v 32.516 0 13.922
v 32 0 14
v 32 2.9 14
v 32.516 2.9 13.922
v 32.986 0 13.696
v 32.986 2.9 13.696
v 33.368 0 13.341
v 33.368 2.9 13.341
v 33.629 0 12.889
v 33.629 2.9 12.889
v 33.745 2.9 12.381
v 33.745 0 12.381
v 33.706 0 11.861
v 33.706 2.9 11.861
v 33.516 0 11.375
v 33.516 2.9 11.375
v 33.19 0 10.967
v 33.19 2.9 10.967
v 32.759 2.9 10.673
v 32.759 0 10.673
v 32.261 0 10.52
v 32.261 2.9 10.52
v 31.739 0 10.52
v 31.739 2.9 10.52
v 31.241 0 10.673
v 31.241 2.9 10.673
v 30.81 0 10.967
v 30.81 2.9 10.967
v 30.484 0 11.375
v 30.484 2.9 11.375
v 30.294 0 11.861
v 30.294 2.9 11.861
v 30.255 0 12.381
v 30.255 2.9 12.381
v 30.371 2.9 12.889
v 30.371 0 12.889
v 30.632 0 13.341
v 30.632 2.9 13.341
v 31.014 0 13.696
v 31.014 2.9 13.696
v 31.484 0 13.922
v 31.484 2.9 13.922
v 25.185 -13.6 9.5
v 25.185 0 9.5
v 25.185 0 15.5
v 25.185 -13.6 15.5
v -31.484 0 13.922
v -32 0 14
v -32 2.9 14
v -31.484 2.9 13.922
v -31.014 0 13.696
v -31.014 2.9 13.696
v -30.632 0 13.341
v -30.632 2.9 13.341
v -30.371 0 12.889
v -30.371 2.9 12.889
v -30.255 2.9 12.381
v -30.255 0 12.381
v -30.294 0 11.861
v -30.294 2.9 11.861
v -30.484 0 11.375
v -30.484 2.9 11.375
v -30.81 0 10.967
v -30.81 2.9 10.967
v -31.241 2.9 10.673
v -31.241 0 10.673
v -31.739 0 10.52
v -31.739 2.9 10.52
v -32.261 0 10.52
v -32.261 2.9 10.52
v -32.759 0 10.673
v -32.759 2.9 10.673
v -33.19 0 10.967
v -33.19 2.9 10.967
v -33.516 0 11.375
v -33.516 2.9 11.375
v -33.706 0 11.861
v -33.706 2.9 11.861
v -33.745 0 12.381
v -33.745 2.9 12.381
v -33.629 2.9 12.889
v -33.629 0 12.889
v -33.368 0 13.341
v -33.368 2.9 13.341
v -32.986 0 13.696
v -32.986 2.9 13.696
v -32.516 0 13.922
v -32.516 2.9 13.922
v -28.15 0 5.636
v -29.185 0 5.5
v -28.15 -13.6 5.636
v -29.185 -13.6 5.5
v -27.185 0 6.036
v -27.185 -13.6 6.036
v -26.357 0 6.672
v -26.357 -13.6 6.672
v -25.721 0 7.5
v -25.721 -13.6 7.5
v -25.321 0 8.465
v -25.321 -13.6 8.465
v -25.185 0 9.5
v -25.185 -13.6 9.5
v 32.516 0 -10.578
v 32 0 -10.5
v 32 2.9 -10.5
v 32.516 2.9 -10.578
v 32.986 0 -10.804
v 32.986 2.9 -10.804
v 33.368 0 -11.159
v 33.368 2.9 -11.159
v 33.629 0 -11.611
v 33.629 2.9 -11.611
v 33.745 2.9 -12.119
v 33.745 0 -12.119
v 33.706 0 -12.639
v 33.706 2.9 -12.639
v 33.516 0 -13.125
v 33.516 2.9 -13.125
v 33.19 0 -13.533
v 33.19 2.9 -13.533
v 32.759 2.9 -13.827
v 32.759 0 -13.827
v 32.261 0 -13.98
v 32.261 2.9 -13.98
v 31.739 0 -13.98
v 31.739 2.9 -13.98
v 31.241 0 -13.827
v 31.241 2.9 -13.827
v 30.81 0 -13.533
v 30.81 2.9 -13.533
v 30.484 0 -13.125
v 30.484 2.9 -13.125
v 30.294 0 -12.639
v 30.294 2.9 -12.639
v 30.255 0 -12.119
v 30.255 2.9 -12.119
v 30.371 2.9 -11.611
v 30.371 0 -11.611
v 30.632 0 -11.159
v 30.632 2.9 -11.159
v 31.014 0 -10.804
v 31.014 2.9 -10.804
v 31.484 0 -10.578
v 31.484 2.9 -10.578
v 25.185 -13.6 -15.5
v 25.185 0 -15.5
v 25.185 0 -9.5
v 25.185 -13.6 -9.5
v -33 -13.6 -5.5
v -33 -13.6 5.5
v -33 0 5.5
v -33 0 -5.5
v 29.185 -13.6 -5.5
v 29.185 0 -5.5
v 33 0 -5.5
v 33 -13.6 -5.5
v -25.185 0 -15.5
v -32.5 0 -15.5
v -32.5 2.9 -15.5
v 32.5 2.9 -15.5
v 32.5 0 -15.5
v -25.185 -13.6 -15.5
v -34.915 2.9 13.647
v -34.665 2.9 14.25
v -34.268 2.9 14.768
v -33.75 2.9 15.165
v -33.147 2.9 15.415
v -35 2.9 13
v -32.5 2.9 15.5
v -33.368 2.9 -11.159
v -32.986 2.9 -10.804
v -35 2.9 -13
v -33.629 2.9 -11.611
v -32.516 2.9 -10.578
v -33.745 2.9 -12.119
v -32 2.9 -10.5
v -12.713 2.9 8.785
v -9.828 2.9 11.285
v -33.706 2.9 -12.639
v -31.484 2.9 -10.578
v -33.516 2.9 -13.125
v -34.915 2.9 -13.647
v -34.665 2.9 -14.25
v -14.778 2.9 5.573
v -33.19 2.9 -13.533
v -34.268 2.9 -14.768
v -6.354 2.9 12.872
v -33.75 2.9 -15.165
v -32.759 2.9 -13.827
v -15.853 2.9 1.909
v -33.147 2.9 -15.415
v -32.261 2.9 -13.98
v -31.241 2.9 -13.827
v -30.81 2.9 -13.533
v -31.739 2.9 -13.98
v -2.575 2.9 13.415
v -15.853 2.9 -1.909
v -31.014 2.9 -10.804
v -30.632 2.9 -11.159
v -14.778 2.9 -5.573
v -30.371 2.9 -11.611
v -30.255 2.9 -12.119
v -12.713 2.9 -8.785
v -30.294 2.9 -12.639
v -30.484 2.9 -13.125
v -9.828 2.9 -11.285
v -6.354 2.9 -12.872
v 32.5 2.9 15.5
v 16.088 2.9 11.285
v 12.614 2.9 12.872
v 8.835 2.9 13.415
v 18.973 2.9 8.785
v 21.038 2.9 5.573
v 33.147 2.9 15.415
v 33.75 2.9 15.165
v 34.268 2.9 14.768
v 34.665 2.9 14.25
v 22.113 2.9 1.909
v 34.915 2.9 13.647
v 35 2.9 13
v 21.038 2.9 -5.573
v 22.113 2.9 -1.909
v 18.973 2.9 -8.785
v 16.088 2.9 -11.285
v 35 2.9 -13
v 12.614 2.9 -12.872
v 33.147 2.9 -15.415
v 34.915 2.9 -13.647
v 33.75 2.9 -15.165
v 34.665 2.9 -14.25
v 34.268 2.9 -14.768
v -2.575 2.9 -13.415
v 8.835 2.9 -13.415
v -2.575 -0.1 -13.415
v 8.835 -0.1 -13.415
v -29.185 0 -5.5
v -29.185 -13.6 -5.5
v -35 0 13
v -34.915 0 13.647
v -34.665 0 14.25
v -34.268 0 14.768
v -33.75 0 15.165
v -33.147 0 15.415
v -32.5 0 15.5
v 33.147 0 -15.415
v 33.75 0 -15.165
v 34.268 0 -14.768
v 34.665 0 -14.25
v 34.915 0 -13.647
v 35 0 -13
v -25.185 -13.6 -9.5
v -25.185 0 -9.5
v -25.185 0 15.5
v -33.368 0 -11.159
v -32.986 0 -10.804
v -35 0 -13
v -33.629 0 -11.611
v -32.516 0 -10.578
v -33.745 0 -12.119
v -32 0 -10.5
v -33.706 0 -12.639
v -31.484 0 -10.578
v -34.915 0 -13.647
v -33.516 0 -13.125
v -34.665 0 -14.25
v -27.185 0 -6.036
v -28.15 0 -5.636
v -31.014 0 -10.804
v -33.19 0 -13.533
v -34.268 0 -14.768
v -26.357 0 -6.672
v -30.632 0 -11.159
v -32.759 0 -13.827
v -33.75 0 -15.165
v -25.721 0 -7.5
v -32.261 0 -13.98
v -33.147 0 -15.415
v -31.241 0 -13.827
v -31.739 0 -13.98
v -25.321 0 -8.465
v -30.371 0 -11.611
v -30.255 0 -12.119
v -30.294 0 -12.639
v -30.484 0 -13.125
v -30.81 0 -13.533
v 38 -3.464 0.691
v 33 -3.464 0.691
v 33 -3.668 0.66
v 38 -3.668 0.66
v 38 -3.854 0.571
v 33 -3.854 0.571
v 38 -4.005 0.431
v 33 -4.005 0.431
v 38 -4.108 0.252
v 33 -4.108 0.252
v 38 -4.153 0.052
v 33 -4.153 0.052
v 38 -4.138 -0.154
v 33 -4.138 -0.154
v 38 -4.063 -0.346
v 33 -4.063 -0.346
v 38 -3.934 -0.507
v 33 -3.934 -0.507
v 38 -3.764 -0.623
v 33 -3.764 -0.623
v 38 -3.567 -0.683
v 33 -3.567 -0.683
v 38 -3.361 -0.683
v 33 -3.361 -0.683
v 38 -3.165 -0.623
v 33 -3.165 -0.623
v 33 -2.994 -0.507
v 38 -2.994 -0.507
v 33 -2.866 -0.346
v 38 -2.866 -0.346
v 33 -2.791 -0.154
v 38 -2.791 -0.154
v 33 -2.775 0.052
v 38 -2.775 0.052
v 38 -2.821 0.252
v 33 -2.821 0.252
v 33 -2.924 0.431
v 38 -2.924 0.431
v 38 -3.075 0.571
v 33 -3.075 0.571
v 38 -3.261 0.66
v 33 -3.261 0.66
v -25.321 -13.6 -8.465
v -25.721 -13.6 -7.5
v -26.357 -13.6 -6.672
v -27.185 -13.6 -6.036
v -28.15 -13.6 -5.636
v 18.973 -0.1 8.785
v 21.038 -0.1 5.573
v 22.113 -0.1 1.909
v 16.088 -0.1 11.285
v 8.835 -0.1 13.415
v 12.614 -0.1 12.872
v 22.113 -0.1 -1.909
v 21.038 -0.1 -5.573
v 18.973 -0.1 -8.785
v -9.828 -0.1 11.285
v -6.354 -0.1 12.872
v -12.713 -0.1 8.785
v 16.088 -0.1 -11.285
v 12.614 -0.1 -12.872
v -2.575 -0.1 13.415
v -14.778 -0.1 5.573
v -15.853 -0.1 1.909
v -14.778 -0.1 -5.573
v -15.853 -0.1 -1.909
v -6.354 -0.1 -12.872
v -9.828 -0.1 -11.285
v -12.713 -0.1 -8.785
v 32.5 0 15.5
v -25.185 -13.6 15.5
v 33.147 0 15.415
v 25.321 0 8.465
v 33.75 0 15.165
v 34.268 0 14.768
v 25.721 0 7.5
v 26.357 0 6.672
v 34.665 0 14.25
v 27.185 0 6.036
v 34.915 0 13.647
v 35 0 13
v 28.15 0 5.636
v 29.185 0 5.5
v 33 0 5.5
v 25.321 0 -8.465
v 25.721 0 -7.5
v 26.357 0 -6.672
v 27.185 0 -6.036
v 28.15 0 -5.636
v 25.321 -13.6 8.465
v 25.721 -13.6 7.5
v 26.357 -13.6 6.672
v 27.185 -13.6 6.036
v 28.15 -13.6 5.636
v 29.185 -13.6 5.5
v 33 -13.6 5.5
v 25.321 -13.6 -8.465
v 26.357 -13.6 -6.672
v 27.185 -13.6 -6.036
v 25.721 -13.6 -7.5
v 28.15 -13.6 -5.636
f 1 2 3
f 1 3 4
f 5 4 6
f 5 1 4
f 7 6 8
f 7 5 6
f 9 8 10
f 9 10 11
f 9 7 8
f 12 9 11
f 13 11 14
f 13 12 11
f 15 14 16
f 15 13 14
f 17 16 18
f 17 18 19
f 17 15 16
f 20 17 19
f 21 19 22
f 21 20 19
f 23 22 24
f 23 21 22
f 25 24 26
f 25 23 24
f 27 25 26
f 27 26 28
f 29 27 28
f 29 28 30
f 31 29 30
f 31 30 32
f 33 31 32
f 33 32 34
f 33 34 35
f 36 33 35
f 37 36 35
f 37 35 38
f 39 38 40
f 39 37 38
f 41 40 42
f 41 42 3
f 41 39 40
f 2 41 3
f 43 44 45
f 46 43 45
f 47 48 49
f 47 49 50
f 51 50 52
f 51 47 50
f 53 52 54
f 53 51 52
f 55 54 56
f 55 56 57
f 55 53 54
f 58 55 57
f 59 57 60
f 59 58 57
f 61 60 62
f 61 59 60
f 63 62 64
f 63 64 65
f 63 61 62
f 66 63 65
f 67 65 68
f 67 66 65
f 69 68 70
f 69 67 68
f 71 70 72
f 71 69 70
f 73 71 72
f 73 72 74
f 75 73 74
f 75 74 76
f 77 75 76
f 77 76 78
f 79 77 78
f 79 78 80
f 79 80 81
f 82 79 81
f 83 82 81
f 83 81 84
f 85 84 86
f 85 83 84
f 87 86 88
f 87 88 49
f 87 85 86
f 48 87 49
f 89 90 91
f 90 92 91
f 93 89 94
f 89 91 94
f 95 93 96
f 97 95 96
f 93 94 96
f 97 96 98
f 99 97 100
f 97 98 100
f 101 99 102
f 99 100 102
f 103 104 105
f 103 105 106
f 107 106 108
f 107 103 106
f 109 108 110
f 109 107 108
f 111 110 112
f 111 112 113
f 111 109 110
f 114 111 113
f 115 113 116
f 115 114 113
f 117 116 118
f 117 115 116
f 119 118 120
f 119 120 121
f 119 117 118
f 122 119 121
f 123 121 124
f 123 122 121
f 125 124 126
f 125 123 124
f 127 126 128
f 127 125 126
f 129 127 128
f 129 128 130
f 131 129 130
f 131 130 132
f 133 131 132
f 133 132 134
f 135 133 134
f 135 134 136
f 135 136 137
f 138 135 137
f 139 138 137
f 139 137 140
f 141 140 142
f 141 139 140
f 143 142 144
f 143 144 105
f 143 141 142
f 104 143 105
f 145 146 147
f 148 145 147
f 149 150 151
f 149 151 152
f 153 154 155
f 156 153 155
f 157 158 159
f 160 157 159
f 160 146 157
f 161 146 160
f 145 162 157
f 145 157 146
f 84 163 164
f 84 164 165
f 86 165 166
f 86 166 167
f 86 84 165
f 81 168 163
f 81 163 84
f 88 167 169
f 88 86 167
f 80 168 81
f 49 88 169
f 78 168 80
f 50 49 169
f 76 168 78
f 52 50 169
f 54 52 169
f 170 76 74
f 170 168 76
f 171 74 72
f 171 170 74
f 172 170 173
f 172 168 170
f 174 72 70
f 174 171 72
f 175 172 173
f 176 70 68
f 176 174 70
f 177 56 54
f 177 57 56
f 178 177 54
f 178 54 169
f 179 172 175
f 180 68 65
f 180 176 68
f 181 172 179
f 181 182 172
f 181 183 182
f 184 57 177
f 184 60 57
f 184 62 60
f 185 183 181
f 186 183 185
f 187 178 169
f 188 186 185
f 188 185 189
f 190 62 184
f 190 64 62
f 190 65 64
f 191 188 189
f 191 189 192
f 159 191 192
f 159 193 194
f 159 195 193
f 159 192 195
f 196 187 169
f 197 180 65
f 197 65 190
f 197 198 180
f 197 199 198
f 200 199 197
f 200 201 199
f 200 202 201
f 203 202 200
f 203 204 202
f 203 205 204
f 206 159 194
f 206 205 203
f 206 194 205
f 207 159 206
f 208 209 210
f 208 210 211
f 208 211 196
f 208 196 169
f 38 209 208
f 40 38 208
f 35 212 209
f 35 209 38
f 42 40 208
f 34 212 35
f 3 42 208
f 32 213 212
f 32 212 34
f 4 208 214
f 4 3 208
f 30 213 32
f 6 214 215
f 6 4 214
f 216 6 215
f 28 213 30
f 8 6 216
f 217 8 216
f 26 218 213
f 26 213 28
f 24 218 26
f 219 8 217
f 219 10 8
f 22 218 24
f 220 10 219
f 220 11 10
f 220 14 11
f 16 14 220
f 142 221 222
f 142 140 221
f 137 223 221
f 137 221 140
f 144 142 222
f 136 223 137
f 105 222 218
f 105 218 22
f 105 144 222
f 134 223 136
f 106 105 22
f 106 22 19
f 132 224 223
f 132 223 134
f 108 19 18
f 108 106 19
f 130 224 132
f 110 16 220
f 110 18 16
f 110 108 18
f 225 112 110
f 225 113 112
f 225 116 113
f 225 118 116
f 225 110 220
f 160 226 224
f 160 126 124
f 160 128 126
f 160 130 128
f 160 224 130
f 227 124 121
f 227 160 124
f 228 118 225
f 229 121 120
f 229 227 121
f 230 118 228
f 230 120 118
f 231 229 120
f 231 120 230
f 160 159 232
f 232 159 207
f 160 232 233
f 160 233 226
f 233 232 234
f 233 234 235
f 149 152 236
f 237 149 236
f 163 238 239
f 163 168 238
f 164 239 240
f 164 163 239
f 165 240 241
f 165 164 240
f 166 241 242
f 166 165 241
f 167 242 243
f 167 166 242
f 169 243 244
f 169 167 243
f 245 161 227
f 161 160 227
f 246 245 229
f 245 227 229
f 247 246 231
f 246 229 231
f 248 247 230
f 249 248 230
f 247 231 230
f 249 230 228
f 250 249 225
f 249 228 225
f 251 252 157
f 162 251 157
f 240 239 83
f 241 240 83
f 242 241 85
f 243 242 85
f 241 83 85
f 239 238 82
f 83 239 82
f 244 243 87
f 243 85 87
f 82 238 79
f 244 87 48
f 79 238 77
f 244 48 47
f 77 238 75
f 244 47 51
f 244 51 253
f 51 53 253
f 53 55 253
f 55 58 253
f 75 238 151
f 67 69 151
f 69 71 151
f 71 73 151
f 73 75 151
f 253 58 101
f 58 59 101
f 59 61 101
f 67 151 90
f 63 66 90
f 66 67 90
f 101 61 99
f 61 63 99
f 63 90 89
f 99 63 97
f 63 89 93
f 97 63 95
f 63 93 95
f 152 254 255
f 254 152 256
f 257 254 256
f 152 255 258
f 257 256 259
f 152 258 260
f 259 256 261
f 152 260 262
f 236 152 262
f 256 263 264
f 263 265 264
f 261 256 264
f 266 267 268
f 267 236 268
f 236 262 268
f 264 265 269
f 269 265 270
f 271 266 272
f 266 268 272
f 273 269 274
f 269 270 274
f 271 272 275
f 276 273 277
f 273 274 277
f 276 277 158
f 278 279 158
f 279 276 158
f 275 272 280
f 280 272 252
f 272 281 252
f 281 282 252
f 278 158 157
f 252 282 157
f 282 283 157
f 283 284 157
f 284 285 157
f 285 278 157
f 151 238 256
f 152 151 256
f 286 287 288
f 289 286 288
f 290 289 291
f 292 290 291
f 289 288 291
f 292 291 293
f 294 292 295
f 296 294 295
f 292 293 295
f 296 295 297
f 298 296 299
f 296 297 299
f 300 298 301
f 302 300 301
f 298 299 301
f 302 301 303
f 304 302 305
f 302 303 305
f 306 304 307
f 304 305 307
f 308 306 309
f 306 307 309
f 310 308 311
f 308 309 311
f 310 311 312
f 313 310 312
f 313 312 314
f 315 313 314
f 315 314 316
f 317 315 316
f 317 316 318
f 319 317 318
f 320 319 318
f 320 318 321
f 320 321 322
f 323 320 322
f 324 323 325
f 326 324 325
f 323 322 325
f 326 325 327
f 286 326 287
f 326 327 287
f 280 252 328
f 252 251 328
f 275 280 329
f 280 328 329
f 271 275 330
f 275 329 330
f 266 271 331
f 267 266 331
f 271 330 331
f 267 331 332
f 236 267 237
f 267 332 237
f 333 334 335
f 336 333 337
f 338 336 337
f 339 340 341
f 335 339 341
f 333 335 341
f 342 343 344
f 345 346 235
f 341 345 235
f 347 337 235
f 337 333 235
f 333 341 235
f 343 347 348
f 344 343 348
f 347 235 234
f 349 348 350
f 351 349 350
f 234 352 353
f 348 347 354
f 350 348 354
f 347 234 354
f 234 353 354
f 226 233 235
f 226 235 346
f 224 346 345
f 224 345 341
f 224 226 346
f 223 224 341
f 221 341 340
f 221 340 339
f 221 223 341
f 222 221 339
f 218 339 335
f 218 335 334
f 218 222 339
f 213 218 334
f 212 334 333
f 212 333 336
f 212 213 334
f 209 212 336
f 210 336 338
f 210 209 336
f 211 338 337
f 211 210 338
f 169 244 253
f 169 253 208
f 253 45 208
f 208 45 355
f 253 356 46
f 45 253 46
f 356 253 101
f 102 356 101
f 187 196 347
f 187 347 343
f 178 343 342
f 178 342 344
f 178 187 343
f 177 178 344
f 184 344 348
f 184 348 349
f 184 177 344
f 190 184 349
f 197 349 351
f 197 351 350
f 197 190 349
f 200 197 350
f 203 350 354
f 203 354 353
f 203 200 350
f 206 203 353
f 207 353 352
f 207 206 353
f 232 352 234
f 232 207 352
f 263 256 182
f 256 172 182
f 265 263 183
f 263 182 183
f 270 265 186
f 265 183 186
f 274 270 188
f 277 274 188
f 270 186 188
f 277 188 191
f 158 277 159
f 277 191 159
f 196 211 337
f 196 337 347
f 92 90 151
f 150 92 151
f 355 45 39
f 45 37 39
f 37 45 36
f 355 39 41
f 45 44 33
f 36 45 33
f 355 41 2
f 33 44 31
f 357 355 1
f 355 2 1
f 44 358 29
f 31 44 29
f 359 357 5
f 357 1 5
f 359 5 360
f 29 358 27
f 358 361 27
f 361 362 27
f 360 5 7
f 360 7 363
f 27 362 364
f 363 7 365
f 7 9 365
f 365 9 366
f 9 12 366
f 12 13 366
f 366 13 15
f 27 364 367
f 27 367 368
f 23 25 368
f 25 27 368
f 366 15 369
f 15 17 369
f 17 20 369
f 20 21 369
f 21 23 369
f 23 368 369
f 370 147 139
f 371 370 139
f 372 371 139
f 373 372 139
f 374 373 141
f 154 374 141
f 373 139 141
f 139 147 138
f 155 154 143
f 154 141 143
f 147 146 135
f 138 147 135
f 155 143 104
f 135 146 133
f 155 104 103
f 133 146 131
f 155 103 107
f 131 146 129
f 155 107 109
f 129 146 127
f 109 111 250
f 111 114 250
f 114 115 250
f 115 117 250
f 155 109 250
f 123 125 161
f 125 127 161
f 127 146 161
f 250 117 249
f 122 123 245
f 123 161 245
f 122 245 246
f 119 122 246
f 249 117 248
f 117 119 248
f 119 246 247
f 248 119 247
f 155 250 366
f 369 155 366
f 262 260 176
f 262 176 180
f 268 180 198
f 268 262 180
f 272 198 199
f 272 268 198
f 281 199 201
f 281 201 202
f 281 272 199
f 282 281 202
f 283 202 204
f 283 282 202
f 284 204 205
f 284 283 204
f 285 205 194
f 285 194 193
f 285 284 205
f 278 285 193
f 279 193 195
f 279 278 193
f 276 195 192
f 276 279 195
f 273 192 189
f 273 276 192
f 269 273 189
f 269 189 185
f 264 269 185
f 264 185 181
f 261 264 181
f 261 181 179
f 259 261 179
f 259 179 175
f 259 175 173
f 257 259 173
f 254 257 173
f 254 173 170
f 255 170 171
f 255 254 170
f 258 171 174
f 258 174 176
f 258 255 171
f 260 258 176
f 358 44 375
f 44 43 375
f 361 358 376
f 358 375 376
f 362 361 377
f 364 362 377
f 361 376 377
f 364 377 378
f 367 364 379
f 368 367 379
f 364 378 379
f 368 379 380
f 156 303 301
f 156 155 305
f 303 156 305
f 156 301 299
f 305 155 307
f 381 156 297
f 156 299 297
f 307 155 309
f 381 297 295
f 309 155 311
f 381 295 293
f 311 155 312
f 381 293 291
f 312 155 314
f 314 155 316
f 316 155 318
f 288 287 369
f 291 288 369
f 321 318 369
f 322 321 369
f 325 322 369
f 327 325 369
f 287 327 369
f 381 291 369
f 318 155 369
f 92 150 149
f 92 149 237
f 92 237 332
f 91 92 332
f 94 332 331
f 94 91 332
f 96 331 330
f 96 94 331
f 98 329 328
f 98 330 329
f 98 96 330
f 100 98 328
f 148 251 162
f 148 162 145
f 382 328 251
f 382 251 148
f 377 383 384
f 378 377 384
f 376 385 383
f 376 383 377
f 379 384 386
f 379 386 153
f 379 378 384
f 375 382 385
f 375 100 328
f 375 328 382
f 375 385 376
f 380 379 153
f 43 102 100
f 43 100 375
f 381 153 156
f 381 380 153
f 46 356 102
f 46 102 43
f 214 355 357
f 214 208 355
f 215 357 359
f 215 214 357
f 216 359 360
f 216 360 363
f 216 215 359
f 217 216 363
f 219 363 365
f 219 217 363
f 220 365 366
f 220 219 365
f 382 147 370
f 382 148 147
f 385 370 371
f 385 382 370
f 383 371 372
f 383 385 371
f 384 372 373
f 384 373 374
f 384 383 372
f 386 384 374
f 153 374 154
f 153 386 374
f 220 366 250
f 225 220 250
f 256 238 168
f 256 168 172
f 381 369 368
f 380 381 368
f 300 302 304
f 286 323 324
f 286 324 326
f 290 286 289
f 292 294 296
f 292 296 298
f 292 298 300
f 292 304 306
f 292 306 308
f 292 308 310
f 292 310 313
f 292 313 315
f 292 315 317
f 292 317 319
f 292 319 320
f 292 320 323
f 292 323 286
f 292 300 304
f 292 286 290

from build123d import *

# Parameters (mm, degrees)
SKETCH1_W           = 70
SKETCH1_H           = 31
SKETCH1_R           = 1.75
BOSS_EXTRUDE1_DEPTH = 2.9
FILLET1_R           = 2.5
BOSS_EXTRUDE2_DEPTH = 13.6
FILLET2_R           = 4
CUT_EXTRUDE1_DEPTH  = 3
SKETCH4_R           = 0.691032606
BOSS_EXTRUDE3_DEPTH = 5


with BuildPart() as part:
    # Sketch1 → Boss-Extrude1 (new body)
    with BuildSketch(Plane(origin=(0, 0, 0), x_dir=(1, 0, 0), z_dir=(0, 1, 0))):
        Rectangle(SKETCH1_W, SKETCH1_H)
        with Locations(Location((-32, 12.25, 0), (0, 0, 270))):
            Circle(SKETCH1_R, mode=Mode.SUBTRACT)
        with Locations(Location((-32, -12.25, 0), (0, 0, 270))):
            Circle(SKETCH1_R, mode=Mode.SUBTRACT)
        with Locations(Location((32, -12.25, 0), (0, 0, 270))):
            Circle(SKETCH1_R, mode=Mode.SUBTRACT)
        with Locations(Location((32, 12.25, 0), (0, 0, 270))):
            Circle(SKETCH1_R, mode=Mode.SUBTRACT)
    extrude(amount=BOSS_EXTRUDE1_DEPTH)

    # Fillet1
    fillet1_edges = [part.edges().sort_by_distance(p)[0] for p in [
        (-35, 1.45, -15.5),
        (35, 1.45, -15.5),
        (35, 1.45, 15.5),
        (-35, 1.45, 15.5),
    ]]
    fillet(fillet1_edges, radius=FILLET1_R)

    # Sketch2 → Boss-Extrude2 (add)
    with BuildSketch(Plane.XZ):
        Polygon((-25.185, -15.5), (25.185, -15.5), (25.185, -5.5), (33, -5.5), (33, 5.5), (25.185, 5.5), (25.185, 15.5), (-25.185, 15.5), (-25.185, 5.5), (-33, 5.5), (-33, -5.5), (-25.185, -5.5), align=None)
    extrude(amount=BOSS_EXTRUDE2_DEPTH)

    # Fillet2
    fillet2_edges = [part.edges().sort_by_distance(p)[0] for p in [
        (25.185, -6.8, 5.5),
        (-25.185, -6.8, 5.5),
        (-25.185, -6.8, -5.5),
        (25.185, -6.8, -5.5),
    ]]
    fillet(fillet2_edges, radius=FILLET2_R)

    # Sketch3 → Cut-Extrude1 (cut)
    with BuildSketch(Plane(origin=(0, 2.9, 0), x_dir=(1, 0, 0), z_dir=(0, 1, 0))):
        with BuildLine():
            Line((-2.575, 13.415), (8.835, 13.415))
            ThreePointArc((8.835, 13.415), (22.25, 0), (8.835, -13.415))
            Line((8.835, -13.415), (-2.575, -13.415))
            ThreePointArc((-2.575, -13.415), (-15.99, 0), (-2.575, 13.415))
        make_face()
    extrude(amount=-CUT_EXTRUDE1_DEPTH, mode=Mode.SUBTRACT)

    # Sketch4 → Boss-Extrude3 (add)
    with BuildSketch(Plane(origin=(33, 0, 0), x_dir=(0, 0, -1), z_dir=(1, 0, 0))):
        with Locations(Location((0, -3.46433499, 0), (0, 0, 180))):
            Circle(SKETCH4_R)
    extrude(amount=BOSS_EXTRUDE3_DEPTH)


solid = part.part
